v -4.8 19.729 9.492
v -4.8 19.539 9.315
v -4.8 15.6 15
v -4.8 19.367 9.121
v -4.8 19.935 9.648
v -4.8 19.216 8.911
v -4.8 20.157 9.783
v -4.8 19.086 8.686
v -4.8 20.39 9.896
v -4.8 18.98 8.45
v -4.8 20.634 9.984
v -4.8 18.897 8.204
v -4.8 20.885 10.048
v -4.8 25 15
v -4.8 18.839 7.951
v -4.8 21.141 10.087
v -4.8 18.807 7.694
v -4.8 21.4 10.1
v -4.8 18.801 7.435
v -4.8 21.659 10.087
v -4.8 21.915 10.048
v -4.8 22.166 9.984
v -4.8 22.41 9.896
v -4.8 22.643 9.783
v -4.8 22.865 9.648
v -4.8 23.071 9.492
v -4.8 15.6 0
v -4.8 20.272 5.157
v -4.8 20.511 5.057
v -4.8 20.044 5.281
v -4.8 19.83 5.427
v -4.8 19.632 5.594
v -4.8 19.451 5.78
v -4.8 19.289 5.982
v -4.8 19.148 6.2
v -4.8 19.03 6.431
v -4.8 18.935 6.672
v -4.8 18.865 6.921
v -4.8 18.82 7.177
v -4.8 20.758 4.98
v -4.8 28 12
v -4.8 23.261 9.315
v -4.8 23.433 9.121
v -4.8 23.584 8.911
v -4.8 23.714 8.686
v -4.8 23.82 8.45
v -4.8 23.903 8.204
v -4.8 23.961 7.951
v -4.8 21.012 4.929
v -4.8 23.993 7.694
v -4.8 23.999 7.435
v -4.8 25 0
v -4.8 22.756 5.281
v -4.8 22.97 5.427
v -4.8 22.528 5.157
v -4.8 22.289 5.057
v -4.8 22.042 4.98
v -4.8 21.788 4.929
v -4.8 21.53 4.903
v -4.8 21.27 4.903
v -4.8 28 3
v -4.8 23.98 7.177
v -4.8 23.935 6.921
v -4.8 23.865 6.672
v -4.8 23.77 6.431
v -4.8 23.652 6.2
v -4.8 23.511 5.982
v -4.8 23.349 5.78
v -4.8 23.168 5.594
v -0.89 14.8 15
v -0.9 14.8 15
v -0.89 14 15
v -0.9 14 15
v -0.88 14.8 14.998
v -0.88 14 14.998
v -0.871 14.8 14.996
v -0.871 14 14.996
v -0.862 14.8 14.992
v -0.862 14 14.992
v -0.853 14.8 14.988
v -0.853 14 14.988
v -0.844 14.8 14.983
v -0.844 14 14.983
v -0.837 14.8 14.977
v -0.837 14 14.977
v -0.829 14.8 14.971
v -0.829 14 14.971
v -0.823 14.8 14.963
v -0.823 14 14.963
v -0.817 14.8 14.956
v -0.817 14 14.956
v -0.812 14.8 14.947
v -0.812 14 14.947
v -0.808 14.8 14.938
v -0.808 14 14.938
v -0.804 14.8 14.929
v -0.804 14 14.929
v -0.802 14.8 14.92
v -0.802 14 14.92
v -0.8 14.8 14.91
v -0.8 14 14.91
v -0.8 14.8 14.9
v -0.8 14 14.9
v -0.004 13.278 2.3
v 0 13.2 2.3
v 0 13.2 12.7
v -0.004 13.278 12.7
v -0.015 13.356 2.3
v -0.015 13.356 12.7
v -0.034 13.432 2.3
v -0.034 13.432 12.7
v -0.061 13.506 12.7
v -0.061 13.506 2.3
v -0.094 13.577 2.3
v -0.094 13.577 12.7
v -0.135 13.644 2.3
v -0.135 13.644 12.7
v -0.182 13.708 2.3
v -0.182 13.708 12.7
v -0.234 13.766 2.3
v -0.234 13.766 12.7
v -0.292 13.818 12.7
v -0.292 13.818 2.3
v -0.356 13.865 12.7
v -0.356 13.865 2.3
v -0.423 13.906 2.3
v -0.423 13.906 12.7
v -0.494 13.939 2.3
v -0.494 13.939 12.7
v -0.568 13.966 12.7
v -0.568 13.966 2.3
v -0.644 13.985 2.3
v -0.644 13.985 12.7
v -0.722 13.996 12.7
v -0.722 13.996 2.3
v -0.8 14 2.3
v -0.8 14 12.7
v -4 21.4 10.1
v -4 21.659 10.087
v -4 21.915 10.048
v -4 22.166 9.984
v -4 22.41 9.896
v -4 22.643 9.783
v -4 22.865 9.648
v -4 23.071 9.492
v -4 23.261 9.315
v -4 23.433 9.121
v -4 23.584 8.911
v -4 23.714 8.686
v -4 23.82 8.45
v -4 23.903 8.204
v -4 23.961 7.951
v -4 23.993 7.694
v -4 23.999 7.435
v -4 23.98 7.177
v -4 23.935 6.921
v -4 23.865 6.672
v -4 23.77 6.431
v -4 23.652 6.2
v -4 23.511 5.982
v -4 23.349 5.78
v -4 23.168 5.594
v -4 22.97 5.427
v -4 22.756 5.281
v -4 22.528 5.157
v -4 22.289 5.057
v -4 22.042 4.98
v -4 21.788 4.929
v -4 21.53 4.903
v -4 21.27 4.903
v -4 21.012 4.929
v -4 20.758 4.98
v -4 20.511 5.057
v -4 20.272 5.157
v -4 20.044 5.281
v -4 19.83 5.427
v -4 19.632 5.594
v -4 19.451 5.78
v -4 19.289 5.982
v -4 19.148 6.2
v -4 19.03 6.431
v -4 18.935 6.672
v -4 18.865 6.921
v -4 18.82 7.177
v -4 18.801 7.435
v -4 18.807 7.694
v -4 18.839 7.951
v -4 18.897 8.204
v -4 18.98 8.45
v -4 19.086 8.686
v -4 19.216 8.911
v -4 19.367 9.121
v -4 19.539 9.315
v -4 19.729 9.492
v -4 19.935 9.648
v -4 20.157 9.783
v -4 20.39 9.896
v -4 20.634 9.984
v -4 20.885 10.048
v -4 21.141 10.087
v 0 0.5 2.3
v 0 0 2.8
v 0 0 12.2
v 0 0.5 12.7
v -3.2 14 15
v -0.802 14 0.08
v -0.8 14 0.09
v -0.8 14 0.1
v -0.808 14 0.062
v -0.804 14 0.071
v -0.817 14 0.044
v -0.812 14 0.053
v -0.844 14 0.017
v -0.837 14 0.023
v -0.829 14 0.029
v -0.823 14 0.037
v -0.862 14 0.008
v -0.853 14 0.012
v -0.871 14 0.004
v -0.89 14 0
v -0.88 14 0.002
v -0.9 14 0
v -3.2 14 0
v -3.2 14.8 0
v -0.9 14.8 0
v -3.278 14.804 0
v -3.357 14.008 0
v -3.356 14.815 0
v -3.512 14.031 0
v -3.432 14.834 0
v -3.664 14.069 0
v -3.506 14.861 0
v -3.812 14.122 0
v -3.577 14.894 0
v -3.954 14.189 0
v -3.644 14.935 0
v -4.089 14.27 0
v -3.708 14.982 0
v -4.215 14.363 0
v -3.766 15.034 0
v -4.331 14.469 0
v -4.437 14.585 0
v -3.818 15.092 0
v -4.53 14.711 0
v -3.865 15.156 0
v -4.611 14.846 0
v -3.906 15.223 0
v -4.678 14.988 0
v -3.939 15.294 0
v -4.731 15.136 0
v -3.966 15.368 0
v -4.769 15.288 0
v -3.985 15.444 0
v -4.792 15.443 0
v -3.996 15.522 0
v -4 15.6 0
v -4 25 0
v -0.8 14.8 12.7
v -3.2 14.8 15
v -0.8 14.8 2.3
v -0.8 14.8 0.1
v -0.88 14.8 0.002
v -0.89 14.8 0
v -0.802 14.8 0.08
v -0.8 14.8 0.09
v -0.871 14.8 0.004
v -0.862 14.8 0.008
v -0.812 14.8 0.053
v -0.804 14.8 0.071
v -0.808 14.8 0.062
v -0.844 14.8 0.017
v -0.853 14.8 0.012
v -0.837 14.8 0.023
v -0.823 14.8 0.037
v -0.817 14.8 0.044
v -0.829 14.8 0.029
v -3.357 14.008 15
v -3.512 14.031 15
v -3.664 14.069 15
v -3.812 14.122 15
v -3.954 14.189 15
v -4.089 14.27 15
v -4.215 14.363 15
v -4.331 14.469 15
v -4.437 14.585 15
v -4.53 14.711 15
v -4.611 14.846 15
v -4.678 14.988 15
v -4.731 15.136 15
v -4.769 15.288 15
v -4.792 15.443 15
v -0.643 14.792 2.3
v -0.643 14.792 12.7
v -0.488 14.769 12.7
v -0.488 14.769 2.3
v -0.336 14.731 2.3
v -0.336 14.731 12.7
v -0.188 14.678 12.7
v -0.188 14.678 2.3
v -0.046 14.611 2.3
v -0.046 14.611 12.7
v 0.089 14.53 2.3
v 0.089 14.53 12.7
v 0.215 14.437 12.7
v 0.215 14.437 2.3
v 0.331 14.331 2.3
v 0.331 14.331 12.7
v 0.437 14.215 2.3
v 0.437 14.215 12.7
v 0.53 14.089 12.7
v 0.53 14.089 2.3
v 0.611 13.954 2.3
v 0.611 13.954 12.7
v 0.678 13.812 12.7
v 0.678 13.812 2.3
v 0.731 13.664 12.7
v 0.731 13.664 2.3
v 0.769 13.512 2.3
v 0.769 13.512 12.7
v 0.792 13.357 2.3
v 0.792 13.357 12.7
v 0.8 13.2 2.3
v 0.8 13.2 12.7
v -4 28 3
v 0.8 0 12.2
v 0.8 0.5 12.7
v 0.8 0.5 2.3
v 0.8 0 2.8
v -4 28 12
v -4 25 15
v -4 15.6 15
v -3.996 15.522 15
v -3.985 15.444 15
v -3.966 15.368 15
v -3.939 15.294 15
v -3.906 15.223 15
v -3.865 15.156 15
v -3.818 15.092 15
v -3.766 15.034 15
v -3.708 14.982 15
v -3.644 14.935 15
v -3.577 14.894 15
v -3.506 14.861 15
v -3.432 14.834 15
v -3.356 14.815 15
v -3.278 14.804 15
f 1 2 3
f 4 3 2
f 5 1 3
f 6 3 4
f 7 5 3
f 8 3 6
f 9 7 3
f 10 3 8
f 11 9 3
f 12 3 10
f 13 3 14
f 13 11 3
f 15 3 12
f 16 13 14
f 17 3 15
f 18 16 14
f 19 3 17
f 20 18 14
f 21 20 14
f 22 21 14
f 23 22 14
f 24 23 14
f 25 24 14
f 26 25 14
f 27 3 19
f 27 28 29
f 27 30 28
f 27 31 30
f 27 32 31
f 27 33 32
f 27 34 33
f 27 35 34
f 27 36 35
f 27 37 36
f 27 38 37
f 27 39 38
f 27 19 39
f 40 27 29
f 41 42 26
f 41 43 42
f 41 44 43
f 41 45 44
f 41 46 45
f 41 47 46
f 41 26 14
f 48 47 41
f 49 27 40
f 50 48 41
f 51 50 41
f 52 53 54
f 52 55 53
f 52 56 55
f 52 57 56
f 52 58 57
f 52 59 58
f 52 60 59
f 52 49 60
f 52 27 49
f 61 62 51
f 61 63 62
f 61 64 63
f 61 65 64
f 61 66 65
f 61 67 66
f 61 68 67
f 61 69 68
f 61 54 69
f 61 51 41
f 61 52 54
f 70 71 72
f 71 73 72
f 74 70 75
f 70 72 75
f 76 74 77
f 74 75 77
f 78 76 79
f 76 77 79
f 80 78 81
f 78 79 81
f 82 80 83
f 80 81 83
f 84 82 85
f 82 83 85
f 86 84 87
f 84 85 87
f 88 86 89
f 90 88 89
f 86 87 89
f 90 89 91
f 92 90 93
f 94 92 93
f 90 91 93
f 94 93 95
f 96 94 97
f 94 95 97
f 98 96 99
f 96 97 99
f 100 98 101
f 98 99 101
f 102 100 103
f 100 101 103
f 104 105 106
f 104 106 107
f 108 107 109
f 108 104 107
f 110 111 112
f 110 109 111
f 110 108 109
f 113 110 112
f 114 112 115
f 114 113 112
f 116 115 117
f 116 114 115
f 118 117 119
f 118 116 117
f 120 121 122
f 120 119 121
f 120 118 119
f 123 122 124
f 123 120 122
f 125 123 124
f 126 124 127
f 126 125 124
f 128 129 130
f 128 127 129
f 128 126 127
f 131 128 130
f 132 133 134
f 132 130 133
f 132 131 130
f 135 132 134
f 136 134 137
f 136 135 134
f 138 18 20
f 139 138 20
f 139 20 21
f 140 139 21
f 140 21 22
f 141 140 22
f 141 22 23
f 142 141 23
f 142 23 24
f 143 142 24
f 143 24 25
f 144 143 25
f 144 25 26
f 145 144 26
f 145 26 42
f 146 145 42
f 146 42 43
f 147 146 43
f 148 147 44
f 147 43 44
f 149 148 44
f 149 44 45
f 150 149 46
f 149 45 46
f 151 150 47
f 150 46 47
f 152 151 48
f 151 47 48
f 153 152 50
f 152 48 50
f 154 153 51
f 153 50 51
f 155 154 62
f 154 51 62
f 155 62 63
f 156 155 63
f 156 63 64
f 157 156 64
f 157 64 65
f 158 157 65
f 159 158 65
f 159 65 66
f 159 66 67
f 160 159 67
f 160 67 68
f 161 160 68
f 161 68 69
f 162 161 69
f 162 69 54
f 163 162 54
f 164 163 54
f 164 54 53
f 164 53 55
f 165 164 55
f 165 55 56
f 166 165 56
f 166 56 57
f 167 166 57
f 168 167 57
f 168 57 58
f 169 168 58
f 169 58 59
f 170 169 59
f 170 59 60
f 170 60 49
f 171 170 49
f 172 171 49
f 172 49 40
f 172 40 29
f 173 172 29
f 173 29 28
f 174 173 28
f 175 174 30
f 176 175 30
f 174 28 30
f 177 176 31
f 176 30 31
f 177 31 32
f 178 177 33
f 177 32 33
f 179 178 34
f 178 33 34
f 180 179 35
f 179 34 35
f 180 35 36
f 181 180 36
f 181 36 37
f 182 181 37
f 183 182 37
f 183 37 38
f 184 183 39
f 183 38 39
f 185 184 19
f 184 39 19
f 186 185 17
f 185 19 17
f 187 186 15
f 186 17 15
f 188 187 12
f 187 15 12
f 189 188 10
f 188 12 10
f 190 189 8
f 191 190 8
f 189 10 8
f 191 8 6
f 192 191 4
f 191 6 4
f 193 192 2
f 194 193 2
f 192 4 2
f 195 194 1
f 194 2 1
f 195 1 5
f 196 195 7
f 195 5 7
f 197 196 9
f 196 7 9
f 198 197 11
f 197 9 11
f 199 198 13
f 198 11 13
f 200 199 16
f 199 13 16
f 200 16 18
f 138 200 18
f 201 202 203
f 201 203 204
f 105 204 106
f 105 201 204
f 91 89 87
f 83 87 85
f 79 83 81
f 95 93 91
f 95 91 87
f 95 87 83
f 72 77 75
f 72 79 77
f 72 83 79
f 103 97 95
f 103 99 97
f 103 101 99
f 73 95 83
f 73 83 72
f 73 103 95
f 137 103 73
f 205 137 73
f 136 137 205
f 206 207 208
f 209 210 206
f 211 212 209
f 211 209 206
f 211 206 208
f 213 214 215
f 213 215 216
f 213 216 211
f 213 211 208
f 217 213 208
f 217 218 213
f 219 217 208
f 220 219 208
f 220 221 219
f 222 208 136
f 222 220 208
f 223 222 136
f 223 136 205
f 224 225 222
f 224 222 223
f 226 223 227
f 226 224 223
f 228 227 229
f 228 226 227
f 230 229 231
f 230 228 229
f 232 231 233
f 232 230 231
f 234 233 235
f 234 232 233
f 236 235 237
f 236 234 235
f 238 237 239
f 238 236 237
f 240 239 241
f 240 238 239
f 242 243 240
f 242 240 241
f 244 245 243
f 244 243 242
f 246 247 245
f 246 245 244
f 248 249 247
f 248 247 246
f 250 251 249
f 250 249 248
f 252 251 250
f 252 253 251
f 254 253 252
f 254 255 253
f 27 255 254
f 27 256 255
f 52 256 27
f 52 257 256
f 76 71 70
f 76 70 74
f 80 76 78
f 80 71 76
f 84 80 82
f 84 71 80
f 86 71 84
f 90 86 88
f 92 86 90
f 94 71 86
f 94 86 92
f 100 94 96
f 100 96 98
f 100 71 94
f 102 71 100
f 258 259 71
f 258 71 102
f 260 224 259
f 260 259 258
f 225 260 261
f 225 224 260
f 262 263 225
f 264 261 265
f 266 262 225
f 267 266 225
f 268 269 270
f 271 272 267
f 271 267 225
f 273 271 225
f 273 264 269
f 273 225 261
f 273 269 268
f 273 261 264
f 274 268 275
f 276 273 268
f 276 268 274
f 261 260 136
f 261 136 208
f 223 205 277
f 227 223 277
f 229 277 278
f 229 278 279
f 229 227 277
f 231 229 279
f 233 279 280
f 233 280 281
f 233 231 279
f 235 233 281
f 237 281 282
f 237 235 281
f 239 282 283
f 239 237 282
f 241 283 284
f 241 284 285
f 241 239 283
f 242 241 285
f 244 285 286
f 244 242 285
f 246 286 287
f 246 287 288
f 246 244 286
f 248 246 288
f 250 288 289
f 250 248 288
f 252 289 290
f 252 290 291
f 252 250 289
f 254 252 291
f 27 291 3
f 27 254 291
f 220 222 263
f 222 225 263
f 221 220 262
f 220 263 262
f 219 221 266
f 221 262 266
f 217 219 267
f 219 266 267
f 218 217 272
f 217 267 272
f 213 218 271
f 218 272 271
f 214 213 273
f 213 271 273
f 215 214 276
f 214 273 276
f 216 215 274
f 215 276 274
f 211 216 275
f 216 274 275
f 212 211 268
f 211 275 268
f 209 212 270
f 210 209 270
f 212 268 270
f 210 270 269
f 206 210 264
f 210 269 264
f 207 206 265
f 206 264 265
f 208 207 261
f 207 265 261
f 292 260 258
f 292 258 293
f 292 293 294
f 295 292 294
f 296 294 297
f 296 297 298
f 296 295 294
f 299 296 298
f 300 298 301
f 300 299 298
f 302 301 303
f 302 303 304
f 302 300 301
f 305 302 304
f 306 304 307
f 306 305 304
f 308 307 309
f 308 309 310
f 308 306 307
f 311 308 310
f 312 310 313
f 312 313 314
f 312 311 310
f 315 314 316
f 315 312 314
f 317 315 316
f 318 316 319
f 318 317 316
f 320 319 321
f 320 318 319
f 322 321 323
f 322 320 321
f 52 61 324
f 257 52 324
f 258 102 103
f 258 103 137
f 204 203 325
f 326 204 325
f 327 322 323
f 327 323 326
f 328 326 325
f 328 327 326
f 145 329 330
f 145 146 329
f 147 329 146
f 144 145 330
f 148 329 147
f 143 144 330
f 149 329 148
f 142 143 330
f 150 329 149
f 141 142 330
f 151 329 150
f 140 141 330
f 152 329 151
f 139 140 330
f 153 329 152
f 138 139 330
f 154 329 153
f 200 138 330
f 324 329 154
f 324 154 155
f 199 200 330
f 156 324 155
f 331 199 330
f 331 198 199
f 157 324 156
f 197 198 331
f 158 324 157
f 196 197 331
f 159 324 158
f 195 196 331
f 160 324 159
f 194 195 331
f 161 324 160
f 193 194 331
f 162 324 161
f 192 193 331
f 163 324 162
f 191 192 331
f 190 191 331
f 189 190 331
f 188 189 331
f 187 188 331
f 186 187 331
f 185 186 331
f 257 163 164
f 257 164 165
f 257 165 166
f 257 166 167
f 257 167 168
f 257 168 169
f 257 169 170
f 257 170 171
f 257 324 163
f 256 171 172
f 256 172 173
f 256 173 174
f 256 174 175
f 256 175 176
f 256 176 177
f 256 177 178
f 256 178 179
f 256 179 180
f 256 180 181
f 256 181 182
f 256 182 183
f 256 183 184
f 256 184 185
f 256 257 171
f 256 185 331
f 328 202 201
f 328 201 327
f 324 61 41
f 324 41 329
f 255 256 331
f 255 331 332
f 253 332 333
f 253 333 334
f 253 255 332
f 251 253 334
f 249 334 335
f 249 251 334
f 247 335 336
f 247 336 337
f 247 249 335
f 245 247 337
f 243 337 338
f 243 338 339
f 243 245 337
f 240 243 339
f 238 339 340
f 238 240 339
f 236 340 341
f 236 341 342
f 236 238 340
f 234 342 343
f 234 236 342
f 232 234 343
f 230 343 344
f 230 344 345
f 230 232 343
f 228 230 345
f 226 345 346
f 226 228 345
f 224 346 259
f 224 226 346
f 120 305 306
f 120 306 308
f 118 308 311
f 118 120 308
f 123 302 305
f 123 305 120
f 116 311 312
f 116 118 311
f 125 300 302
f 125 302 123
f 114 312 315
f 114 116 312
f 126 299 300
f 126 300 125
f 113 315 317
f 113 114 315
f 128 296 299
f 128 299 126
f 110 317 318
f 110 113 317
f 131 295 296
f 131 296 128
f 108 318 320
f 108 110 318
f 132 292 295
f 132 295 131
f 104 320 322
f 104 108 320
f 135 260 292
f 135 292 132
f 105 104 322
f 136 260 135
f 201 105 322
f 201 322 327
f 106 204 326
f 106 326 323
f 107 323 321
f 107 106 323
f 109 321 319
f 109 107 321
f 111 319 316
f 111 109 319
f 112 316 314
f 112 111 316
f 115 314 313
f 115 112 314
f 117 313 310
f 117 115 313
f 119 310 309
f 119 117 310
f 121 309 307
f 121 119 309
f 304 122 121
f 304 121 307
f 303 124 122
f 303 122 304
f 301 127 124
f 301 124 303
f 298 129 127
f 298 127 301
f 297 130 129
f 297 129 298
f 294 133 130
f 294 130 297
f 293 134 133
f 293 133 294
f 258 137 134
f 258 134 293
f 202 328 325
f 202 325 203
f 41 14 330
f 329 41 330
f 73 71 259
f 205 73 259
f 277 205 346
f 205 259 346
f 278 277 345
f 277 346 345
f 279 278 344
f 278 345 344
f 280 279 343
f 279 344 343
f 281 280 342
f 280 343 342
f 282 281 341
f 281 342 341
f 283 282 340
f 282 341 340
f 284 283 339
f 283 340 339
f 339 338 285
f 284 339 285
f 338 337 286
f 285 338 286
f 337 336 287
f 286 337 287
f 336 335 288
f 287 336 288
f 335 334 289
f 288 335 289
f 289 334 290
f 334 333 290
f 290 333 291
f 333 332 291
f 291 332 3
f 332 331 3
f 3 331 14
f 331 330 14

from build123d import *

# Parameters (mm, degrees)
ODGI_CIE_BAZOWE1_DEPTH          = 15
WYTNIJ_WYCI_GNI_CIE1_DEPTH      = 33.254612073
WYTNIJ_WYCI_GNI_CIE1_DEPTH_BACK = 1.6
SZKIC6_W                        = 2.3
SZKIC6_H                        = 1.6
SZKIC6_H_2                      = 13.2
WYTNIJ_WYCI_GNI_CIE2_REACH      = 34.255
SZKIC7_R                        = 2.6
SFAZOWANIE1_SIZE                = 3
ZAOKR_GLENIE1_R                 = 0.1
SFAZOWANIE2_SIZE                = 0.5


# Sheet-metal steps are written as plain solids
with BuildPart() as part:
    # Szkic1 → Odgięcie bazowe1 (new body)
    with BuildSketch(Plane.XY):
        with BuildLine():
            Line((0, 0), (0, 13.2))
            ThreePointArc((0, 13.2), (-0.234314575, 13.765685425), (-0.8, 14))
            Line((-0.8, 14), (-3.2, 14))
            ThreePointArc((-3.2, 14), (-4.33137085, 14.46862915), (-4.8, 15.6))
            Line((-4.8, 15.6), (-4.8, 28))
            Line((-4.8, 28), (-4, 28))
            Line((-4, 28), (-4, 15.6))
            ThreePointArc((-4, 15.6), (-3.765685425, 15.034314575), (-3.2, 14.8))
            Line((-3.2, 14.8), (-0.8, 14.8))
            ThreePointArc((-0.8, 14.8), (0.33137085, 14.33137085), (0.8, 13.2))
            Line((0.8, 13.2), (0.8, 0))
            Line((0.8, 0), (0, 0))
        make_face()
    extrude(amount=ODGI_CIE_BAZOWE1_DEPTH)

    # Szkic6 → Wytnij-wyciągnięcie1 (cut, two sides: drawn at the far end of the back side and taken through both)
    with BuildSketch(Plane(origin=(0.8, 0, 0), x_dir=(0, 0, -1), z_dir=(1, 0, 0)).offset(-WYTNIJ_WYCI_GNI_CIE1_DEPTH_BACK)):
        with Locations((-13.85, 14)):
            Rectangle(SZKIC6_W, SZKIC6_H)
        with Locations((-1.15, 14)):
            Rectangle(SZKIC6_W, SZKIC6_H)
        with Locations((-1.15, 6.6)):
            Rectangle(SZKIC6_W, SZKIC6_H_2)
        with Locations((-13.85, 6.6)):
            Rectangle(SZKIC6_W, SZKIC6_H_2)
    extrude(amount=WYTNIJ_WYCI_GNI_CIE1_DEPTH + WYTNIJ_WYCI_GNI_CIE1_DEPTH_BACK, mode=Mode.SUBTRACT)

    # Szkic7 → Wytnij-wyciągnięcie2 (cut, up to next)
    with BuildSketch(Plane.ZY.offset(4.8), mode=Mode.PRIVATE) as wytnij_wyci_gni_cie2_sk1:
        with Locations((7.5, 21.4)):
            Circle(SZKIC7_R)
    wytnij_wyci_gni_cie2_tool1 = extrude(wytnij_wyci_gni_cie2_sk1.sketch, amount=-WYTNIJ_WYCI_GNI_CIE2_REACH, mode=Mode.PRIVATE) & part.part
    add(wytnij_wyci_gni_cie2_tool1.solids().sort_by_distance((-4.8, 21.4, 7.5))[0], mode=Mode.SUBTRACT)

    # Sfazowanie1
    sfazowanie1_edges = [part.edges().sort_by_distance(p)[0] for p in [
        (-4.4, 28, 0),
        (-4.4, 28, 15),
    ]]
    chamfer(sfazowanie1_edges, length=SFAZOWANIE1_SIZE)

    # Zaokrąglenie1
    zaokr_glenie1_edges = [part.edges().sort_by_distance(p)[0] for p in [
        (-0.8, 14.4, 0),
        (-0.8, 14.4, 15),
    ]]
    fillet(zaokr_glenie1_edges, radius=ZAOKR_GLENIE1_R)

    # Sfazowanie2
    sfazowanie2_edges = [part.edges().sort_by_distance(p)[0] for p in [
        (0.4, 0, 2.3),
        (0.4, 0, 12.7),
    ]]
    chamfer(sfazowanie2_edges, length=SFAZOWANIE2_SIZE)


solid = part.part
